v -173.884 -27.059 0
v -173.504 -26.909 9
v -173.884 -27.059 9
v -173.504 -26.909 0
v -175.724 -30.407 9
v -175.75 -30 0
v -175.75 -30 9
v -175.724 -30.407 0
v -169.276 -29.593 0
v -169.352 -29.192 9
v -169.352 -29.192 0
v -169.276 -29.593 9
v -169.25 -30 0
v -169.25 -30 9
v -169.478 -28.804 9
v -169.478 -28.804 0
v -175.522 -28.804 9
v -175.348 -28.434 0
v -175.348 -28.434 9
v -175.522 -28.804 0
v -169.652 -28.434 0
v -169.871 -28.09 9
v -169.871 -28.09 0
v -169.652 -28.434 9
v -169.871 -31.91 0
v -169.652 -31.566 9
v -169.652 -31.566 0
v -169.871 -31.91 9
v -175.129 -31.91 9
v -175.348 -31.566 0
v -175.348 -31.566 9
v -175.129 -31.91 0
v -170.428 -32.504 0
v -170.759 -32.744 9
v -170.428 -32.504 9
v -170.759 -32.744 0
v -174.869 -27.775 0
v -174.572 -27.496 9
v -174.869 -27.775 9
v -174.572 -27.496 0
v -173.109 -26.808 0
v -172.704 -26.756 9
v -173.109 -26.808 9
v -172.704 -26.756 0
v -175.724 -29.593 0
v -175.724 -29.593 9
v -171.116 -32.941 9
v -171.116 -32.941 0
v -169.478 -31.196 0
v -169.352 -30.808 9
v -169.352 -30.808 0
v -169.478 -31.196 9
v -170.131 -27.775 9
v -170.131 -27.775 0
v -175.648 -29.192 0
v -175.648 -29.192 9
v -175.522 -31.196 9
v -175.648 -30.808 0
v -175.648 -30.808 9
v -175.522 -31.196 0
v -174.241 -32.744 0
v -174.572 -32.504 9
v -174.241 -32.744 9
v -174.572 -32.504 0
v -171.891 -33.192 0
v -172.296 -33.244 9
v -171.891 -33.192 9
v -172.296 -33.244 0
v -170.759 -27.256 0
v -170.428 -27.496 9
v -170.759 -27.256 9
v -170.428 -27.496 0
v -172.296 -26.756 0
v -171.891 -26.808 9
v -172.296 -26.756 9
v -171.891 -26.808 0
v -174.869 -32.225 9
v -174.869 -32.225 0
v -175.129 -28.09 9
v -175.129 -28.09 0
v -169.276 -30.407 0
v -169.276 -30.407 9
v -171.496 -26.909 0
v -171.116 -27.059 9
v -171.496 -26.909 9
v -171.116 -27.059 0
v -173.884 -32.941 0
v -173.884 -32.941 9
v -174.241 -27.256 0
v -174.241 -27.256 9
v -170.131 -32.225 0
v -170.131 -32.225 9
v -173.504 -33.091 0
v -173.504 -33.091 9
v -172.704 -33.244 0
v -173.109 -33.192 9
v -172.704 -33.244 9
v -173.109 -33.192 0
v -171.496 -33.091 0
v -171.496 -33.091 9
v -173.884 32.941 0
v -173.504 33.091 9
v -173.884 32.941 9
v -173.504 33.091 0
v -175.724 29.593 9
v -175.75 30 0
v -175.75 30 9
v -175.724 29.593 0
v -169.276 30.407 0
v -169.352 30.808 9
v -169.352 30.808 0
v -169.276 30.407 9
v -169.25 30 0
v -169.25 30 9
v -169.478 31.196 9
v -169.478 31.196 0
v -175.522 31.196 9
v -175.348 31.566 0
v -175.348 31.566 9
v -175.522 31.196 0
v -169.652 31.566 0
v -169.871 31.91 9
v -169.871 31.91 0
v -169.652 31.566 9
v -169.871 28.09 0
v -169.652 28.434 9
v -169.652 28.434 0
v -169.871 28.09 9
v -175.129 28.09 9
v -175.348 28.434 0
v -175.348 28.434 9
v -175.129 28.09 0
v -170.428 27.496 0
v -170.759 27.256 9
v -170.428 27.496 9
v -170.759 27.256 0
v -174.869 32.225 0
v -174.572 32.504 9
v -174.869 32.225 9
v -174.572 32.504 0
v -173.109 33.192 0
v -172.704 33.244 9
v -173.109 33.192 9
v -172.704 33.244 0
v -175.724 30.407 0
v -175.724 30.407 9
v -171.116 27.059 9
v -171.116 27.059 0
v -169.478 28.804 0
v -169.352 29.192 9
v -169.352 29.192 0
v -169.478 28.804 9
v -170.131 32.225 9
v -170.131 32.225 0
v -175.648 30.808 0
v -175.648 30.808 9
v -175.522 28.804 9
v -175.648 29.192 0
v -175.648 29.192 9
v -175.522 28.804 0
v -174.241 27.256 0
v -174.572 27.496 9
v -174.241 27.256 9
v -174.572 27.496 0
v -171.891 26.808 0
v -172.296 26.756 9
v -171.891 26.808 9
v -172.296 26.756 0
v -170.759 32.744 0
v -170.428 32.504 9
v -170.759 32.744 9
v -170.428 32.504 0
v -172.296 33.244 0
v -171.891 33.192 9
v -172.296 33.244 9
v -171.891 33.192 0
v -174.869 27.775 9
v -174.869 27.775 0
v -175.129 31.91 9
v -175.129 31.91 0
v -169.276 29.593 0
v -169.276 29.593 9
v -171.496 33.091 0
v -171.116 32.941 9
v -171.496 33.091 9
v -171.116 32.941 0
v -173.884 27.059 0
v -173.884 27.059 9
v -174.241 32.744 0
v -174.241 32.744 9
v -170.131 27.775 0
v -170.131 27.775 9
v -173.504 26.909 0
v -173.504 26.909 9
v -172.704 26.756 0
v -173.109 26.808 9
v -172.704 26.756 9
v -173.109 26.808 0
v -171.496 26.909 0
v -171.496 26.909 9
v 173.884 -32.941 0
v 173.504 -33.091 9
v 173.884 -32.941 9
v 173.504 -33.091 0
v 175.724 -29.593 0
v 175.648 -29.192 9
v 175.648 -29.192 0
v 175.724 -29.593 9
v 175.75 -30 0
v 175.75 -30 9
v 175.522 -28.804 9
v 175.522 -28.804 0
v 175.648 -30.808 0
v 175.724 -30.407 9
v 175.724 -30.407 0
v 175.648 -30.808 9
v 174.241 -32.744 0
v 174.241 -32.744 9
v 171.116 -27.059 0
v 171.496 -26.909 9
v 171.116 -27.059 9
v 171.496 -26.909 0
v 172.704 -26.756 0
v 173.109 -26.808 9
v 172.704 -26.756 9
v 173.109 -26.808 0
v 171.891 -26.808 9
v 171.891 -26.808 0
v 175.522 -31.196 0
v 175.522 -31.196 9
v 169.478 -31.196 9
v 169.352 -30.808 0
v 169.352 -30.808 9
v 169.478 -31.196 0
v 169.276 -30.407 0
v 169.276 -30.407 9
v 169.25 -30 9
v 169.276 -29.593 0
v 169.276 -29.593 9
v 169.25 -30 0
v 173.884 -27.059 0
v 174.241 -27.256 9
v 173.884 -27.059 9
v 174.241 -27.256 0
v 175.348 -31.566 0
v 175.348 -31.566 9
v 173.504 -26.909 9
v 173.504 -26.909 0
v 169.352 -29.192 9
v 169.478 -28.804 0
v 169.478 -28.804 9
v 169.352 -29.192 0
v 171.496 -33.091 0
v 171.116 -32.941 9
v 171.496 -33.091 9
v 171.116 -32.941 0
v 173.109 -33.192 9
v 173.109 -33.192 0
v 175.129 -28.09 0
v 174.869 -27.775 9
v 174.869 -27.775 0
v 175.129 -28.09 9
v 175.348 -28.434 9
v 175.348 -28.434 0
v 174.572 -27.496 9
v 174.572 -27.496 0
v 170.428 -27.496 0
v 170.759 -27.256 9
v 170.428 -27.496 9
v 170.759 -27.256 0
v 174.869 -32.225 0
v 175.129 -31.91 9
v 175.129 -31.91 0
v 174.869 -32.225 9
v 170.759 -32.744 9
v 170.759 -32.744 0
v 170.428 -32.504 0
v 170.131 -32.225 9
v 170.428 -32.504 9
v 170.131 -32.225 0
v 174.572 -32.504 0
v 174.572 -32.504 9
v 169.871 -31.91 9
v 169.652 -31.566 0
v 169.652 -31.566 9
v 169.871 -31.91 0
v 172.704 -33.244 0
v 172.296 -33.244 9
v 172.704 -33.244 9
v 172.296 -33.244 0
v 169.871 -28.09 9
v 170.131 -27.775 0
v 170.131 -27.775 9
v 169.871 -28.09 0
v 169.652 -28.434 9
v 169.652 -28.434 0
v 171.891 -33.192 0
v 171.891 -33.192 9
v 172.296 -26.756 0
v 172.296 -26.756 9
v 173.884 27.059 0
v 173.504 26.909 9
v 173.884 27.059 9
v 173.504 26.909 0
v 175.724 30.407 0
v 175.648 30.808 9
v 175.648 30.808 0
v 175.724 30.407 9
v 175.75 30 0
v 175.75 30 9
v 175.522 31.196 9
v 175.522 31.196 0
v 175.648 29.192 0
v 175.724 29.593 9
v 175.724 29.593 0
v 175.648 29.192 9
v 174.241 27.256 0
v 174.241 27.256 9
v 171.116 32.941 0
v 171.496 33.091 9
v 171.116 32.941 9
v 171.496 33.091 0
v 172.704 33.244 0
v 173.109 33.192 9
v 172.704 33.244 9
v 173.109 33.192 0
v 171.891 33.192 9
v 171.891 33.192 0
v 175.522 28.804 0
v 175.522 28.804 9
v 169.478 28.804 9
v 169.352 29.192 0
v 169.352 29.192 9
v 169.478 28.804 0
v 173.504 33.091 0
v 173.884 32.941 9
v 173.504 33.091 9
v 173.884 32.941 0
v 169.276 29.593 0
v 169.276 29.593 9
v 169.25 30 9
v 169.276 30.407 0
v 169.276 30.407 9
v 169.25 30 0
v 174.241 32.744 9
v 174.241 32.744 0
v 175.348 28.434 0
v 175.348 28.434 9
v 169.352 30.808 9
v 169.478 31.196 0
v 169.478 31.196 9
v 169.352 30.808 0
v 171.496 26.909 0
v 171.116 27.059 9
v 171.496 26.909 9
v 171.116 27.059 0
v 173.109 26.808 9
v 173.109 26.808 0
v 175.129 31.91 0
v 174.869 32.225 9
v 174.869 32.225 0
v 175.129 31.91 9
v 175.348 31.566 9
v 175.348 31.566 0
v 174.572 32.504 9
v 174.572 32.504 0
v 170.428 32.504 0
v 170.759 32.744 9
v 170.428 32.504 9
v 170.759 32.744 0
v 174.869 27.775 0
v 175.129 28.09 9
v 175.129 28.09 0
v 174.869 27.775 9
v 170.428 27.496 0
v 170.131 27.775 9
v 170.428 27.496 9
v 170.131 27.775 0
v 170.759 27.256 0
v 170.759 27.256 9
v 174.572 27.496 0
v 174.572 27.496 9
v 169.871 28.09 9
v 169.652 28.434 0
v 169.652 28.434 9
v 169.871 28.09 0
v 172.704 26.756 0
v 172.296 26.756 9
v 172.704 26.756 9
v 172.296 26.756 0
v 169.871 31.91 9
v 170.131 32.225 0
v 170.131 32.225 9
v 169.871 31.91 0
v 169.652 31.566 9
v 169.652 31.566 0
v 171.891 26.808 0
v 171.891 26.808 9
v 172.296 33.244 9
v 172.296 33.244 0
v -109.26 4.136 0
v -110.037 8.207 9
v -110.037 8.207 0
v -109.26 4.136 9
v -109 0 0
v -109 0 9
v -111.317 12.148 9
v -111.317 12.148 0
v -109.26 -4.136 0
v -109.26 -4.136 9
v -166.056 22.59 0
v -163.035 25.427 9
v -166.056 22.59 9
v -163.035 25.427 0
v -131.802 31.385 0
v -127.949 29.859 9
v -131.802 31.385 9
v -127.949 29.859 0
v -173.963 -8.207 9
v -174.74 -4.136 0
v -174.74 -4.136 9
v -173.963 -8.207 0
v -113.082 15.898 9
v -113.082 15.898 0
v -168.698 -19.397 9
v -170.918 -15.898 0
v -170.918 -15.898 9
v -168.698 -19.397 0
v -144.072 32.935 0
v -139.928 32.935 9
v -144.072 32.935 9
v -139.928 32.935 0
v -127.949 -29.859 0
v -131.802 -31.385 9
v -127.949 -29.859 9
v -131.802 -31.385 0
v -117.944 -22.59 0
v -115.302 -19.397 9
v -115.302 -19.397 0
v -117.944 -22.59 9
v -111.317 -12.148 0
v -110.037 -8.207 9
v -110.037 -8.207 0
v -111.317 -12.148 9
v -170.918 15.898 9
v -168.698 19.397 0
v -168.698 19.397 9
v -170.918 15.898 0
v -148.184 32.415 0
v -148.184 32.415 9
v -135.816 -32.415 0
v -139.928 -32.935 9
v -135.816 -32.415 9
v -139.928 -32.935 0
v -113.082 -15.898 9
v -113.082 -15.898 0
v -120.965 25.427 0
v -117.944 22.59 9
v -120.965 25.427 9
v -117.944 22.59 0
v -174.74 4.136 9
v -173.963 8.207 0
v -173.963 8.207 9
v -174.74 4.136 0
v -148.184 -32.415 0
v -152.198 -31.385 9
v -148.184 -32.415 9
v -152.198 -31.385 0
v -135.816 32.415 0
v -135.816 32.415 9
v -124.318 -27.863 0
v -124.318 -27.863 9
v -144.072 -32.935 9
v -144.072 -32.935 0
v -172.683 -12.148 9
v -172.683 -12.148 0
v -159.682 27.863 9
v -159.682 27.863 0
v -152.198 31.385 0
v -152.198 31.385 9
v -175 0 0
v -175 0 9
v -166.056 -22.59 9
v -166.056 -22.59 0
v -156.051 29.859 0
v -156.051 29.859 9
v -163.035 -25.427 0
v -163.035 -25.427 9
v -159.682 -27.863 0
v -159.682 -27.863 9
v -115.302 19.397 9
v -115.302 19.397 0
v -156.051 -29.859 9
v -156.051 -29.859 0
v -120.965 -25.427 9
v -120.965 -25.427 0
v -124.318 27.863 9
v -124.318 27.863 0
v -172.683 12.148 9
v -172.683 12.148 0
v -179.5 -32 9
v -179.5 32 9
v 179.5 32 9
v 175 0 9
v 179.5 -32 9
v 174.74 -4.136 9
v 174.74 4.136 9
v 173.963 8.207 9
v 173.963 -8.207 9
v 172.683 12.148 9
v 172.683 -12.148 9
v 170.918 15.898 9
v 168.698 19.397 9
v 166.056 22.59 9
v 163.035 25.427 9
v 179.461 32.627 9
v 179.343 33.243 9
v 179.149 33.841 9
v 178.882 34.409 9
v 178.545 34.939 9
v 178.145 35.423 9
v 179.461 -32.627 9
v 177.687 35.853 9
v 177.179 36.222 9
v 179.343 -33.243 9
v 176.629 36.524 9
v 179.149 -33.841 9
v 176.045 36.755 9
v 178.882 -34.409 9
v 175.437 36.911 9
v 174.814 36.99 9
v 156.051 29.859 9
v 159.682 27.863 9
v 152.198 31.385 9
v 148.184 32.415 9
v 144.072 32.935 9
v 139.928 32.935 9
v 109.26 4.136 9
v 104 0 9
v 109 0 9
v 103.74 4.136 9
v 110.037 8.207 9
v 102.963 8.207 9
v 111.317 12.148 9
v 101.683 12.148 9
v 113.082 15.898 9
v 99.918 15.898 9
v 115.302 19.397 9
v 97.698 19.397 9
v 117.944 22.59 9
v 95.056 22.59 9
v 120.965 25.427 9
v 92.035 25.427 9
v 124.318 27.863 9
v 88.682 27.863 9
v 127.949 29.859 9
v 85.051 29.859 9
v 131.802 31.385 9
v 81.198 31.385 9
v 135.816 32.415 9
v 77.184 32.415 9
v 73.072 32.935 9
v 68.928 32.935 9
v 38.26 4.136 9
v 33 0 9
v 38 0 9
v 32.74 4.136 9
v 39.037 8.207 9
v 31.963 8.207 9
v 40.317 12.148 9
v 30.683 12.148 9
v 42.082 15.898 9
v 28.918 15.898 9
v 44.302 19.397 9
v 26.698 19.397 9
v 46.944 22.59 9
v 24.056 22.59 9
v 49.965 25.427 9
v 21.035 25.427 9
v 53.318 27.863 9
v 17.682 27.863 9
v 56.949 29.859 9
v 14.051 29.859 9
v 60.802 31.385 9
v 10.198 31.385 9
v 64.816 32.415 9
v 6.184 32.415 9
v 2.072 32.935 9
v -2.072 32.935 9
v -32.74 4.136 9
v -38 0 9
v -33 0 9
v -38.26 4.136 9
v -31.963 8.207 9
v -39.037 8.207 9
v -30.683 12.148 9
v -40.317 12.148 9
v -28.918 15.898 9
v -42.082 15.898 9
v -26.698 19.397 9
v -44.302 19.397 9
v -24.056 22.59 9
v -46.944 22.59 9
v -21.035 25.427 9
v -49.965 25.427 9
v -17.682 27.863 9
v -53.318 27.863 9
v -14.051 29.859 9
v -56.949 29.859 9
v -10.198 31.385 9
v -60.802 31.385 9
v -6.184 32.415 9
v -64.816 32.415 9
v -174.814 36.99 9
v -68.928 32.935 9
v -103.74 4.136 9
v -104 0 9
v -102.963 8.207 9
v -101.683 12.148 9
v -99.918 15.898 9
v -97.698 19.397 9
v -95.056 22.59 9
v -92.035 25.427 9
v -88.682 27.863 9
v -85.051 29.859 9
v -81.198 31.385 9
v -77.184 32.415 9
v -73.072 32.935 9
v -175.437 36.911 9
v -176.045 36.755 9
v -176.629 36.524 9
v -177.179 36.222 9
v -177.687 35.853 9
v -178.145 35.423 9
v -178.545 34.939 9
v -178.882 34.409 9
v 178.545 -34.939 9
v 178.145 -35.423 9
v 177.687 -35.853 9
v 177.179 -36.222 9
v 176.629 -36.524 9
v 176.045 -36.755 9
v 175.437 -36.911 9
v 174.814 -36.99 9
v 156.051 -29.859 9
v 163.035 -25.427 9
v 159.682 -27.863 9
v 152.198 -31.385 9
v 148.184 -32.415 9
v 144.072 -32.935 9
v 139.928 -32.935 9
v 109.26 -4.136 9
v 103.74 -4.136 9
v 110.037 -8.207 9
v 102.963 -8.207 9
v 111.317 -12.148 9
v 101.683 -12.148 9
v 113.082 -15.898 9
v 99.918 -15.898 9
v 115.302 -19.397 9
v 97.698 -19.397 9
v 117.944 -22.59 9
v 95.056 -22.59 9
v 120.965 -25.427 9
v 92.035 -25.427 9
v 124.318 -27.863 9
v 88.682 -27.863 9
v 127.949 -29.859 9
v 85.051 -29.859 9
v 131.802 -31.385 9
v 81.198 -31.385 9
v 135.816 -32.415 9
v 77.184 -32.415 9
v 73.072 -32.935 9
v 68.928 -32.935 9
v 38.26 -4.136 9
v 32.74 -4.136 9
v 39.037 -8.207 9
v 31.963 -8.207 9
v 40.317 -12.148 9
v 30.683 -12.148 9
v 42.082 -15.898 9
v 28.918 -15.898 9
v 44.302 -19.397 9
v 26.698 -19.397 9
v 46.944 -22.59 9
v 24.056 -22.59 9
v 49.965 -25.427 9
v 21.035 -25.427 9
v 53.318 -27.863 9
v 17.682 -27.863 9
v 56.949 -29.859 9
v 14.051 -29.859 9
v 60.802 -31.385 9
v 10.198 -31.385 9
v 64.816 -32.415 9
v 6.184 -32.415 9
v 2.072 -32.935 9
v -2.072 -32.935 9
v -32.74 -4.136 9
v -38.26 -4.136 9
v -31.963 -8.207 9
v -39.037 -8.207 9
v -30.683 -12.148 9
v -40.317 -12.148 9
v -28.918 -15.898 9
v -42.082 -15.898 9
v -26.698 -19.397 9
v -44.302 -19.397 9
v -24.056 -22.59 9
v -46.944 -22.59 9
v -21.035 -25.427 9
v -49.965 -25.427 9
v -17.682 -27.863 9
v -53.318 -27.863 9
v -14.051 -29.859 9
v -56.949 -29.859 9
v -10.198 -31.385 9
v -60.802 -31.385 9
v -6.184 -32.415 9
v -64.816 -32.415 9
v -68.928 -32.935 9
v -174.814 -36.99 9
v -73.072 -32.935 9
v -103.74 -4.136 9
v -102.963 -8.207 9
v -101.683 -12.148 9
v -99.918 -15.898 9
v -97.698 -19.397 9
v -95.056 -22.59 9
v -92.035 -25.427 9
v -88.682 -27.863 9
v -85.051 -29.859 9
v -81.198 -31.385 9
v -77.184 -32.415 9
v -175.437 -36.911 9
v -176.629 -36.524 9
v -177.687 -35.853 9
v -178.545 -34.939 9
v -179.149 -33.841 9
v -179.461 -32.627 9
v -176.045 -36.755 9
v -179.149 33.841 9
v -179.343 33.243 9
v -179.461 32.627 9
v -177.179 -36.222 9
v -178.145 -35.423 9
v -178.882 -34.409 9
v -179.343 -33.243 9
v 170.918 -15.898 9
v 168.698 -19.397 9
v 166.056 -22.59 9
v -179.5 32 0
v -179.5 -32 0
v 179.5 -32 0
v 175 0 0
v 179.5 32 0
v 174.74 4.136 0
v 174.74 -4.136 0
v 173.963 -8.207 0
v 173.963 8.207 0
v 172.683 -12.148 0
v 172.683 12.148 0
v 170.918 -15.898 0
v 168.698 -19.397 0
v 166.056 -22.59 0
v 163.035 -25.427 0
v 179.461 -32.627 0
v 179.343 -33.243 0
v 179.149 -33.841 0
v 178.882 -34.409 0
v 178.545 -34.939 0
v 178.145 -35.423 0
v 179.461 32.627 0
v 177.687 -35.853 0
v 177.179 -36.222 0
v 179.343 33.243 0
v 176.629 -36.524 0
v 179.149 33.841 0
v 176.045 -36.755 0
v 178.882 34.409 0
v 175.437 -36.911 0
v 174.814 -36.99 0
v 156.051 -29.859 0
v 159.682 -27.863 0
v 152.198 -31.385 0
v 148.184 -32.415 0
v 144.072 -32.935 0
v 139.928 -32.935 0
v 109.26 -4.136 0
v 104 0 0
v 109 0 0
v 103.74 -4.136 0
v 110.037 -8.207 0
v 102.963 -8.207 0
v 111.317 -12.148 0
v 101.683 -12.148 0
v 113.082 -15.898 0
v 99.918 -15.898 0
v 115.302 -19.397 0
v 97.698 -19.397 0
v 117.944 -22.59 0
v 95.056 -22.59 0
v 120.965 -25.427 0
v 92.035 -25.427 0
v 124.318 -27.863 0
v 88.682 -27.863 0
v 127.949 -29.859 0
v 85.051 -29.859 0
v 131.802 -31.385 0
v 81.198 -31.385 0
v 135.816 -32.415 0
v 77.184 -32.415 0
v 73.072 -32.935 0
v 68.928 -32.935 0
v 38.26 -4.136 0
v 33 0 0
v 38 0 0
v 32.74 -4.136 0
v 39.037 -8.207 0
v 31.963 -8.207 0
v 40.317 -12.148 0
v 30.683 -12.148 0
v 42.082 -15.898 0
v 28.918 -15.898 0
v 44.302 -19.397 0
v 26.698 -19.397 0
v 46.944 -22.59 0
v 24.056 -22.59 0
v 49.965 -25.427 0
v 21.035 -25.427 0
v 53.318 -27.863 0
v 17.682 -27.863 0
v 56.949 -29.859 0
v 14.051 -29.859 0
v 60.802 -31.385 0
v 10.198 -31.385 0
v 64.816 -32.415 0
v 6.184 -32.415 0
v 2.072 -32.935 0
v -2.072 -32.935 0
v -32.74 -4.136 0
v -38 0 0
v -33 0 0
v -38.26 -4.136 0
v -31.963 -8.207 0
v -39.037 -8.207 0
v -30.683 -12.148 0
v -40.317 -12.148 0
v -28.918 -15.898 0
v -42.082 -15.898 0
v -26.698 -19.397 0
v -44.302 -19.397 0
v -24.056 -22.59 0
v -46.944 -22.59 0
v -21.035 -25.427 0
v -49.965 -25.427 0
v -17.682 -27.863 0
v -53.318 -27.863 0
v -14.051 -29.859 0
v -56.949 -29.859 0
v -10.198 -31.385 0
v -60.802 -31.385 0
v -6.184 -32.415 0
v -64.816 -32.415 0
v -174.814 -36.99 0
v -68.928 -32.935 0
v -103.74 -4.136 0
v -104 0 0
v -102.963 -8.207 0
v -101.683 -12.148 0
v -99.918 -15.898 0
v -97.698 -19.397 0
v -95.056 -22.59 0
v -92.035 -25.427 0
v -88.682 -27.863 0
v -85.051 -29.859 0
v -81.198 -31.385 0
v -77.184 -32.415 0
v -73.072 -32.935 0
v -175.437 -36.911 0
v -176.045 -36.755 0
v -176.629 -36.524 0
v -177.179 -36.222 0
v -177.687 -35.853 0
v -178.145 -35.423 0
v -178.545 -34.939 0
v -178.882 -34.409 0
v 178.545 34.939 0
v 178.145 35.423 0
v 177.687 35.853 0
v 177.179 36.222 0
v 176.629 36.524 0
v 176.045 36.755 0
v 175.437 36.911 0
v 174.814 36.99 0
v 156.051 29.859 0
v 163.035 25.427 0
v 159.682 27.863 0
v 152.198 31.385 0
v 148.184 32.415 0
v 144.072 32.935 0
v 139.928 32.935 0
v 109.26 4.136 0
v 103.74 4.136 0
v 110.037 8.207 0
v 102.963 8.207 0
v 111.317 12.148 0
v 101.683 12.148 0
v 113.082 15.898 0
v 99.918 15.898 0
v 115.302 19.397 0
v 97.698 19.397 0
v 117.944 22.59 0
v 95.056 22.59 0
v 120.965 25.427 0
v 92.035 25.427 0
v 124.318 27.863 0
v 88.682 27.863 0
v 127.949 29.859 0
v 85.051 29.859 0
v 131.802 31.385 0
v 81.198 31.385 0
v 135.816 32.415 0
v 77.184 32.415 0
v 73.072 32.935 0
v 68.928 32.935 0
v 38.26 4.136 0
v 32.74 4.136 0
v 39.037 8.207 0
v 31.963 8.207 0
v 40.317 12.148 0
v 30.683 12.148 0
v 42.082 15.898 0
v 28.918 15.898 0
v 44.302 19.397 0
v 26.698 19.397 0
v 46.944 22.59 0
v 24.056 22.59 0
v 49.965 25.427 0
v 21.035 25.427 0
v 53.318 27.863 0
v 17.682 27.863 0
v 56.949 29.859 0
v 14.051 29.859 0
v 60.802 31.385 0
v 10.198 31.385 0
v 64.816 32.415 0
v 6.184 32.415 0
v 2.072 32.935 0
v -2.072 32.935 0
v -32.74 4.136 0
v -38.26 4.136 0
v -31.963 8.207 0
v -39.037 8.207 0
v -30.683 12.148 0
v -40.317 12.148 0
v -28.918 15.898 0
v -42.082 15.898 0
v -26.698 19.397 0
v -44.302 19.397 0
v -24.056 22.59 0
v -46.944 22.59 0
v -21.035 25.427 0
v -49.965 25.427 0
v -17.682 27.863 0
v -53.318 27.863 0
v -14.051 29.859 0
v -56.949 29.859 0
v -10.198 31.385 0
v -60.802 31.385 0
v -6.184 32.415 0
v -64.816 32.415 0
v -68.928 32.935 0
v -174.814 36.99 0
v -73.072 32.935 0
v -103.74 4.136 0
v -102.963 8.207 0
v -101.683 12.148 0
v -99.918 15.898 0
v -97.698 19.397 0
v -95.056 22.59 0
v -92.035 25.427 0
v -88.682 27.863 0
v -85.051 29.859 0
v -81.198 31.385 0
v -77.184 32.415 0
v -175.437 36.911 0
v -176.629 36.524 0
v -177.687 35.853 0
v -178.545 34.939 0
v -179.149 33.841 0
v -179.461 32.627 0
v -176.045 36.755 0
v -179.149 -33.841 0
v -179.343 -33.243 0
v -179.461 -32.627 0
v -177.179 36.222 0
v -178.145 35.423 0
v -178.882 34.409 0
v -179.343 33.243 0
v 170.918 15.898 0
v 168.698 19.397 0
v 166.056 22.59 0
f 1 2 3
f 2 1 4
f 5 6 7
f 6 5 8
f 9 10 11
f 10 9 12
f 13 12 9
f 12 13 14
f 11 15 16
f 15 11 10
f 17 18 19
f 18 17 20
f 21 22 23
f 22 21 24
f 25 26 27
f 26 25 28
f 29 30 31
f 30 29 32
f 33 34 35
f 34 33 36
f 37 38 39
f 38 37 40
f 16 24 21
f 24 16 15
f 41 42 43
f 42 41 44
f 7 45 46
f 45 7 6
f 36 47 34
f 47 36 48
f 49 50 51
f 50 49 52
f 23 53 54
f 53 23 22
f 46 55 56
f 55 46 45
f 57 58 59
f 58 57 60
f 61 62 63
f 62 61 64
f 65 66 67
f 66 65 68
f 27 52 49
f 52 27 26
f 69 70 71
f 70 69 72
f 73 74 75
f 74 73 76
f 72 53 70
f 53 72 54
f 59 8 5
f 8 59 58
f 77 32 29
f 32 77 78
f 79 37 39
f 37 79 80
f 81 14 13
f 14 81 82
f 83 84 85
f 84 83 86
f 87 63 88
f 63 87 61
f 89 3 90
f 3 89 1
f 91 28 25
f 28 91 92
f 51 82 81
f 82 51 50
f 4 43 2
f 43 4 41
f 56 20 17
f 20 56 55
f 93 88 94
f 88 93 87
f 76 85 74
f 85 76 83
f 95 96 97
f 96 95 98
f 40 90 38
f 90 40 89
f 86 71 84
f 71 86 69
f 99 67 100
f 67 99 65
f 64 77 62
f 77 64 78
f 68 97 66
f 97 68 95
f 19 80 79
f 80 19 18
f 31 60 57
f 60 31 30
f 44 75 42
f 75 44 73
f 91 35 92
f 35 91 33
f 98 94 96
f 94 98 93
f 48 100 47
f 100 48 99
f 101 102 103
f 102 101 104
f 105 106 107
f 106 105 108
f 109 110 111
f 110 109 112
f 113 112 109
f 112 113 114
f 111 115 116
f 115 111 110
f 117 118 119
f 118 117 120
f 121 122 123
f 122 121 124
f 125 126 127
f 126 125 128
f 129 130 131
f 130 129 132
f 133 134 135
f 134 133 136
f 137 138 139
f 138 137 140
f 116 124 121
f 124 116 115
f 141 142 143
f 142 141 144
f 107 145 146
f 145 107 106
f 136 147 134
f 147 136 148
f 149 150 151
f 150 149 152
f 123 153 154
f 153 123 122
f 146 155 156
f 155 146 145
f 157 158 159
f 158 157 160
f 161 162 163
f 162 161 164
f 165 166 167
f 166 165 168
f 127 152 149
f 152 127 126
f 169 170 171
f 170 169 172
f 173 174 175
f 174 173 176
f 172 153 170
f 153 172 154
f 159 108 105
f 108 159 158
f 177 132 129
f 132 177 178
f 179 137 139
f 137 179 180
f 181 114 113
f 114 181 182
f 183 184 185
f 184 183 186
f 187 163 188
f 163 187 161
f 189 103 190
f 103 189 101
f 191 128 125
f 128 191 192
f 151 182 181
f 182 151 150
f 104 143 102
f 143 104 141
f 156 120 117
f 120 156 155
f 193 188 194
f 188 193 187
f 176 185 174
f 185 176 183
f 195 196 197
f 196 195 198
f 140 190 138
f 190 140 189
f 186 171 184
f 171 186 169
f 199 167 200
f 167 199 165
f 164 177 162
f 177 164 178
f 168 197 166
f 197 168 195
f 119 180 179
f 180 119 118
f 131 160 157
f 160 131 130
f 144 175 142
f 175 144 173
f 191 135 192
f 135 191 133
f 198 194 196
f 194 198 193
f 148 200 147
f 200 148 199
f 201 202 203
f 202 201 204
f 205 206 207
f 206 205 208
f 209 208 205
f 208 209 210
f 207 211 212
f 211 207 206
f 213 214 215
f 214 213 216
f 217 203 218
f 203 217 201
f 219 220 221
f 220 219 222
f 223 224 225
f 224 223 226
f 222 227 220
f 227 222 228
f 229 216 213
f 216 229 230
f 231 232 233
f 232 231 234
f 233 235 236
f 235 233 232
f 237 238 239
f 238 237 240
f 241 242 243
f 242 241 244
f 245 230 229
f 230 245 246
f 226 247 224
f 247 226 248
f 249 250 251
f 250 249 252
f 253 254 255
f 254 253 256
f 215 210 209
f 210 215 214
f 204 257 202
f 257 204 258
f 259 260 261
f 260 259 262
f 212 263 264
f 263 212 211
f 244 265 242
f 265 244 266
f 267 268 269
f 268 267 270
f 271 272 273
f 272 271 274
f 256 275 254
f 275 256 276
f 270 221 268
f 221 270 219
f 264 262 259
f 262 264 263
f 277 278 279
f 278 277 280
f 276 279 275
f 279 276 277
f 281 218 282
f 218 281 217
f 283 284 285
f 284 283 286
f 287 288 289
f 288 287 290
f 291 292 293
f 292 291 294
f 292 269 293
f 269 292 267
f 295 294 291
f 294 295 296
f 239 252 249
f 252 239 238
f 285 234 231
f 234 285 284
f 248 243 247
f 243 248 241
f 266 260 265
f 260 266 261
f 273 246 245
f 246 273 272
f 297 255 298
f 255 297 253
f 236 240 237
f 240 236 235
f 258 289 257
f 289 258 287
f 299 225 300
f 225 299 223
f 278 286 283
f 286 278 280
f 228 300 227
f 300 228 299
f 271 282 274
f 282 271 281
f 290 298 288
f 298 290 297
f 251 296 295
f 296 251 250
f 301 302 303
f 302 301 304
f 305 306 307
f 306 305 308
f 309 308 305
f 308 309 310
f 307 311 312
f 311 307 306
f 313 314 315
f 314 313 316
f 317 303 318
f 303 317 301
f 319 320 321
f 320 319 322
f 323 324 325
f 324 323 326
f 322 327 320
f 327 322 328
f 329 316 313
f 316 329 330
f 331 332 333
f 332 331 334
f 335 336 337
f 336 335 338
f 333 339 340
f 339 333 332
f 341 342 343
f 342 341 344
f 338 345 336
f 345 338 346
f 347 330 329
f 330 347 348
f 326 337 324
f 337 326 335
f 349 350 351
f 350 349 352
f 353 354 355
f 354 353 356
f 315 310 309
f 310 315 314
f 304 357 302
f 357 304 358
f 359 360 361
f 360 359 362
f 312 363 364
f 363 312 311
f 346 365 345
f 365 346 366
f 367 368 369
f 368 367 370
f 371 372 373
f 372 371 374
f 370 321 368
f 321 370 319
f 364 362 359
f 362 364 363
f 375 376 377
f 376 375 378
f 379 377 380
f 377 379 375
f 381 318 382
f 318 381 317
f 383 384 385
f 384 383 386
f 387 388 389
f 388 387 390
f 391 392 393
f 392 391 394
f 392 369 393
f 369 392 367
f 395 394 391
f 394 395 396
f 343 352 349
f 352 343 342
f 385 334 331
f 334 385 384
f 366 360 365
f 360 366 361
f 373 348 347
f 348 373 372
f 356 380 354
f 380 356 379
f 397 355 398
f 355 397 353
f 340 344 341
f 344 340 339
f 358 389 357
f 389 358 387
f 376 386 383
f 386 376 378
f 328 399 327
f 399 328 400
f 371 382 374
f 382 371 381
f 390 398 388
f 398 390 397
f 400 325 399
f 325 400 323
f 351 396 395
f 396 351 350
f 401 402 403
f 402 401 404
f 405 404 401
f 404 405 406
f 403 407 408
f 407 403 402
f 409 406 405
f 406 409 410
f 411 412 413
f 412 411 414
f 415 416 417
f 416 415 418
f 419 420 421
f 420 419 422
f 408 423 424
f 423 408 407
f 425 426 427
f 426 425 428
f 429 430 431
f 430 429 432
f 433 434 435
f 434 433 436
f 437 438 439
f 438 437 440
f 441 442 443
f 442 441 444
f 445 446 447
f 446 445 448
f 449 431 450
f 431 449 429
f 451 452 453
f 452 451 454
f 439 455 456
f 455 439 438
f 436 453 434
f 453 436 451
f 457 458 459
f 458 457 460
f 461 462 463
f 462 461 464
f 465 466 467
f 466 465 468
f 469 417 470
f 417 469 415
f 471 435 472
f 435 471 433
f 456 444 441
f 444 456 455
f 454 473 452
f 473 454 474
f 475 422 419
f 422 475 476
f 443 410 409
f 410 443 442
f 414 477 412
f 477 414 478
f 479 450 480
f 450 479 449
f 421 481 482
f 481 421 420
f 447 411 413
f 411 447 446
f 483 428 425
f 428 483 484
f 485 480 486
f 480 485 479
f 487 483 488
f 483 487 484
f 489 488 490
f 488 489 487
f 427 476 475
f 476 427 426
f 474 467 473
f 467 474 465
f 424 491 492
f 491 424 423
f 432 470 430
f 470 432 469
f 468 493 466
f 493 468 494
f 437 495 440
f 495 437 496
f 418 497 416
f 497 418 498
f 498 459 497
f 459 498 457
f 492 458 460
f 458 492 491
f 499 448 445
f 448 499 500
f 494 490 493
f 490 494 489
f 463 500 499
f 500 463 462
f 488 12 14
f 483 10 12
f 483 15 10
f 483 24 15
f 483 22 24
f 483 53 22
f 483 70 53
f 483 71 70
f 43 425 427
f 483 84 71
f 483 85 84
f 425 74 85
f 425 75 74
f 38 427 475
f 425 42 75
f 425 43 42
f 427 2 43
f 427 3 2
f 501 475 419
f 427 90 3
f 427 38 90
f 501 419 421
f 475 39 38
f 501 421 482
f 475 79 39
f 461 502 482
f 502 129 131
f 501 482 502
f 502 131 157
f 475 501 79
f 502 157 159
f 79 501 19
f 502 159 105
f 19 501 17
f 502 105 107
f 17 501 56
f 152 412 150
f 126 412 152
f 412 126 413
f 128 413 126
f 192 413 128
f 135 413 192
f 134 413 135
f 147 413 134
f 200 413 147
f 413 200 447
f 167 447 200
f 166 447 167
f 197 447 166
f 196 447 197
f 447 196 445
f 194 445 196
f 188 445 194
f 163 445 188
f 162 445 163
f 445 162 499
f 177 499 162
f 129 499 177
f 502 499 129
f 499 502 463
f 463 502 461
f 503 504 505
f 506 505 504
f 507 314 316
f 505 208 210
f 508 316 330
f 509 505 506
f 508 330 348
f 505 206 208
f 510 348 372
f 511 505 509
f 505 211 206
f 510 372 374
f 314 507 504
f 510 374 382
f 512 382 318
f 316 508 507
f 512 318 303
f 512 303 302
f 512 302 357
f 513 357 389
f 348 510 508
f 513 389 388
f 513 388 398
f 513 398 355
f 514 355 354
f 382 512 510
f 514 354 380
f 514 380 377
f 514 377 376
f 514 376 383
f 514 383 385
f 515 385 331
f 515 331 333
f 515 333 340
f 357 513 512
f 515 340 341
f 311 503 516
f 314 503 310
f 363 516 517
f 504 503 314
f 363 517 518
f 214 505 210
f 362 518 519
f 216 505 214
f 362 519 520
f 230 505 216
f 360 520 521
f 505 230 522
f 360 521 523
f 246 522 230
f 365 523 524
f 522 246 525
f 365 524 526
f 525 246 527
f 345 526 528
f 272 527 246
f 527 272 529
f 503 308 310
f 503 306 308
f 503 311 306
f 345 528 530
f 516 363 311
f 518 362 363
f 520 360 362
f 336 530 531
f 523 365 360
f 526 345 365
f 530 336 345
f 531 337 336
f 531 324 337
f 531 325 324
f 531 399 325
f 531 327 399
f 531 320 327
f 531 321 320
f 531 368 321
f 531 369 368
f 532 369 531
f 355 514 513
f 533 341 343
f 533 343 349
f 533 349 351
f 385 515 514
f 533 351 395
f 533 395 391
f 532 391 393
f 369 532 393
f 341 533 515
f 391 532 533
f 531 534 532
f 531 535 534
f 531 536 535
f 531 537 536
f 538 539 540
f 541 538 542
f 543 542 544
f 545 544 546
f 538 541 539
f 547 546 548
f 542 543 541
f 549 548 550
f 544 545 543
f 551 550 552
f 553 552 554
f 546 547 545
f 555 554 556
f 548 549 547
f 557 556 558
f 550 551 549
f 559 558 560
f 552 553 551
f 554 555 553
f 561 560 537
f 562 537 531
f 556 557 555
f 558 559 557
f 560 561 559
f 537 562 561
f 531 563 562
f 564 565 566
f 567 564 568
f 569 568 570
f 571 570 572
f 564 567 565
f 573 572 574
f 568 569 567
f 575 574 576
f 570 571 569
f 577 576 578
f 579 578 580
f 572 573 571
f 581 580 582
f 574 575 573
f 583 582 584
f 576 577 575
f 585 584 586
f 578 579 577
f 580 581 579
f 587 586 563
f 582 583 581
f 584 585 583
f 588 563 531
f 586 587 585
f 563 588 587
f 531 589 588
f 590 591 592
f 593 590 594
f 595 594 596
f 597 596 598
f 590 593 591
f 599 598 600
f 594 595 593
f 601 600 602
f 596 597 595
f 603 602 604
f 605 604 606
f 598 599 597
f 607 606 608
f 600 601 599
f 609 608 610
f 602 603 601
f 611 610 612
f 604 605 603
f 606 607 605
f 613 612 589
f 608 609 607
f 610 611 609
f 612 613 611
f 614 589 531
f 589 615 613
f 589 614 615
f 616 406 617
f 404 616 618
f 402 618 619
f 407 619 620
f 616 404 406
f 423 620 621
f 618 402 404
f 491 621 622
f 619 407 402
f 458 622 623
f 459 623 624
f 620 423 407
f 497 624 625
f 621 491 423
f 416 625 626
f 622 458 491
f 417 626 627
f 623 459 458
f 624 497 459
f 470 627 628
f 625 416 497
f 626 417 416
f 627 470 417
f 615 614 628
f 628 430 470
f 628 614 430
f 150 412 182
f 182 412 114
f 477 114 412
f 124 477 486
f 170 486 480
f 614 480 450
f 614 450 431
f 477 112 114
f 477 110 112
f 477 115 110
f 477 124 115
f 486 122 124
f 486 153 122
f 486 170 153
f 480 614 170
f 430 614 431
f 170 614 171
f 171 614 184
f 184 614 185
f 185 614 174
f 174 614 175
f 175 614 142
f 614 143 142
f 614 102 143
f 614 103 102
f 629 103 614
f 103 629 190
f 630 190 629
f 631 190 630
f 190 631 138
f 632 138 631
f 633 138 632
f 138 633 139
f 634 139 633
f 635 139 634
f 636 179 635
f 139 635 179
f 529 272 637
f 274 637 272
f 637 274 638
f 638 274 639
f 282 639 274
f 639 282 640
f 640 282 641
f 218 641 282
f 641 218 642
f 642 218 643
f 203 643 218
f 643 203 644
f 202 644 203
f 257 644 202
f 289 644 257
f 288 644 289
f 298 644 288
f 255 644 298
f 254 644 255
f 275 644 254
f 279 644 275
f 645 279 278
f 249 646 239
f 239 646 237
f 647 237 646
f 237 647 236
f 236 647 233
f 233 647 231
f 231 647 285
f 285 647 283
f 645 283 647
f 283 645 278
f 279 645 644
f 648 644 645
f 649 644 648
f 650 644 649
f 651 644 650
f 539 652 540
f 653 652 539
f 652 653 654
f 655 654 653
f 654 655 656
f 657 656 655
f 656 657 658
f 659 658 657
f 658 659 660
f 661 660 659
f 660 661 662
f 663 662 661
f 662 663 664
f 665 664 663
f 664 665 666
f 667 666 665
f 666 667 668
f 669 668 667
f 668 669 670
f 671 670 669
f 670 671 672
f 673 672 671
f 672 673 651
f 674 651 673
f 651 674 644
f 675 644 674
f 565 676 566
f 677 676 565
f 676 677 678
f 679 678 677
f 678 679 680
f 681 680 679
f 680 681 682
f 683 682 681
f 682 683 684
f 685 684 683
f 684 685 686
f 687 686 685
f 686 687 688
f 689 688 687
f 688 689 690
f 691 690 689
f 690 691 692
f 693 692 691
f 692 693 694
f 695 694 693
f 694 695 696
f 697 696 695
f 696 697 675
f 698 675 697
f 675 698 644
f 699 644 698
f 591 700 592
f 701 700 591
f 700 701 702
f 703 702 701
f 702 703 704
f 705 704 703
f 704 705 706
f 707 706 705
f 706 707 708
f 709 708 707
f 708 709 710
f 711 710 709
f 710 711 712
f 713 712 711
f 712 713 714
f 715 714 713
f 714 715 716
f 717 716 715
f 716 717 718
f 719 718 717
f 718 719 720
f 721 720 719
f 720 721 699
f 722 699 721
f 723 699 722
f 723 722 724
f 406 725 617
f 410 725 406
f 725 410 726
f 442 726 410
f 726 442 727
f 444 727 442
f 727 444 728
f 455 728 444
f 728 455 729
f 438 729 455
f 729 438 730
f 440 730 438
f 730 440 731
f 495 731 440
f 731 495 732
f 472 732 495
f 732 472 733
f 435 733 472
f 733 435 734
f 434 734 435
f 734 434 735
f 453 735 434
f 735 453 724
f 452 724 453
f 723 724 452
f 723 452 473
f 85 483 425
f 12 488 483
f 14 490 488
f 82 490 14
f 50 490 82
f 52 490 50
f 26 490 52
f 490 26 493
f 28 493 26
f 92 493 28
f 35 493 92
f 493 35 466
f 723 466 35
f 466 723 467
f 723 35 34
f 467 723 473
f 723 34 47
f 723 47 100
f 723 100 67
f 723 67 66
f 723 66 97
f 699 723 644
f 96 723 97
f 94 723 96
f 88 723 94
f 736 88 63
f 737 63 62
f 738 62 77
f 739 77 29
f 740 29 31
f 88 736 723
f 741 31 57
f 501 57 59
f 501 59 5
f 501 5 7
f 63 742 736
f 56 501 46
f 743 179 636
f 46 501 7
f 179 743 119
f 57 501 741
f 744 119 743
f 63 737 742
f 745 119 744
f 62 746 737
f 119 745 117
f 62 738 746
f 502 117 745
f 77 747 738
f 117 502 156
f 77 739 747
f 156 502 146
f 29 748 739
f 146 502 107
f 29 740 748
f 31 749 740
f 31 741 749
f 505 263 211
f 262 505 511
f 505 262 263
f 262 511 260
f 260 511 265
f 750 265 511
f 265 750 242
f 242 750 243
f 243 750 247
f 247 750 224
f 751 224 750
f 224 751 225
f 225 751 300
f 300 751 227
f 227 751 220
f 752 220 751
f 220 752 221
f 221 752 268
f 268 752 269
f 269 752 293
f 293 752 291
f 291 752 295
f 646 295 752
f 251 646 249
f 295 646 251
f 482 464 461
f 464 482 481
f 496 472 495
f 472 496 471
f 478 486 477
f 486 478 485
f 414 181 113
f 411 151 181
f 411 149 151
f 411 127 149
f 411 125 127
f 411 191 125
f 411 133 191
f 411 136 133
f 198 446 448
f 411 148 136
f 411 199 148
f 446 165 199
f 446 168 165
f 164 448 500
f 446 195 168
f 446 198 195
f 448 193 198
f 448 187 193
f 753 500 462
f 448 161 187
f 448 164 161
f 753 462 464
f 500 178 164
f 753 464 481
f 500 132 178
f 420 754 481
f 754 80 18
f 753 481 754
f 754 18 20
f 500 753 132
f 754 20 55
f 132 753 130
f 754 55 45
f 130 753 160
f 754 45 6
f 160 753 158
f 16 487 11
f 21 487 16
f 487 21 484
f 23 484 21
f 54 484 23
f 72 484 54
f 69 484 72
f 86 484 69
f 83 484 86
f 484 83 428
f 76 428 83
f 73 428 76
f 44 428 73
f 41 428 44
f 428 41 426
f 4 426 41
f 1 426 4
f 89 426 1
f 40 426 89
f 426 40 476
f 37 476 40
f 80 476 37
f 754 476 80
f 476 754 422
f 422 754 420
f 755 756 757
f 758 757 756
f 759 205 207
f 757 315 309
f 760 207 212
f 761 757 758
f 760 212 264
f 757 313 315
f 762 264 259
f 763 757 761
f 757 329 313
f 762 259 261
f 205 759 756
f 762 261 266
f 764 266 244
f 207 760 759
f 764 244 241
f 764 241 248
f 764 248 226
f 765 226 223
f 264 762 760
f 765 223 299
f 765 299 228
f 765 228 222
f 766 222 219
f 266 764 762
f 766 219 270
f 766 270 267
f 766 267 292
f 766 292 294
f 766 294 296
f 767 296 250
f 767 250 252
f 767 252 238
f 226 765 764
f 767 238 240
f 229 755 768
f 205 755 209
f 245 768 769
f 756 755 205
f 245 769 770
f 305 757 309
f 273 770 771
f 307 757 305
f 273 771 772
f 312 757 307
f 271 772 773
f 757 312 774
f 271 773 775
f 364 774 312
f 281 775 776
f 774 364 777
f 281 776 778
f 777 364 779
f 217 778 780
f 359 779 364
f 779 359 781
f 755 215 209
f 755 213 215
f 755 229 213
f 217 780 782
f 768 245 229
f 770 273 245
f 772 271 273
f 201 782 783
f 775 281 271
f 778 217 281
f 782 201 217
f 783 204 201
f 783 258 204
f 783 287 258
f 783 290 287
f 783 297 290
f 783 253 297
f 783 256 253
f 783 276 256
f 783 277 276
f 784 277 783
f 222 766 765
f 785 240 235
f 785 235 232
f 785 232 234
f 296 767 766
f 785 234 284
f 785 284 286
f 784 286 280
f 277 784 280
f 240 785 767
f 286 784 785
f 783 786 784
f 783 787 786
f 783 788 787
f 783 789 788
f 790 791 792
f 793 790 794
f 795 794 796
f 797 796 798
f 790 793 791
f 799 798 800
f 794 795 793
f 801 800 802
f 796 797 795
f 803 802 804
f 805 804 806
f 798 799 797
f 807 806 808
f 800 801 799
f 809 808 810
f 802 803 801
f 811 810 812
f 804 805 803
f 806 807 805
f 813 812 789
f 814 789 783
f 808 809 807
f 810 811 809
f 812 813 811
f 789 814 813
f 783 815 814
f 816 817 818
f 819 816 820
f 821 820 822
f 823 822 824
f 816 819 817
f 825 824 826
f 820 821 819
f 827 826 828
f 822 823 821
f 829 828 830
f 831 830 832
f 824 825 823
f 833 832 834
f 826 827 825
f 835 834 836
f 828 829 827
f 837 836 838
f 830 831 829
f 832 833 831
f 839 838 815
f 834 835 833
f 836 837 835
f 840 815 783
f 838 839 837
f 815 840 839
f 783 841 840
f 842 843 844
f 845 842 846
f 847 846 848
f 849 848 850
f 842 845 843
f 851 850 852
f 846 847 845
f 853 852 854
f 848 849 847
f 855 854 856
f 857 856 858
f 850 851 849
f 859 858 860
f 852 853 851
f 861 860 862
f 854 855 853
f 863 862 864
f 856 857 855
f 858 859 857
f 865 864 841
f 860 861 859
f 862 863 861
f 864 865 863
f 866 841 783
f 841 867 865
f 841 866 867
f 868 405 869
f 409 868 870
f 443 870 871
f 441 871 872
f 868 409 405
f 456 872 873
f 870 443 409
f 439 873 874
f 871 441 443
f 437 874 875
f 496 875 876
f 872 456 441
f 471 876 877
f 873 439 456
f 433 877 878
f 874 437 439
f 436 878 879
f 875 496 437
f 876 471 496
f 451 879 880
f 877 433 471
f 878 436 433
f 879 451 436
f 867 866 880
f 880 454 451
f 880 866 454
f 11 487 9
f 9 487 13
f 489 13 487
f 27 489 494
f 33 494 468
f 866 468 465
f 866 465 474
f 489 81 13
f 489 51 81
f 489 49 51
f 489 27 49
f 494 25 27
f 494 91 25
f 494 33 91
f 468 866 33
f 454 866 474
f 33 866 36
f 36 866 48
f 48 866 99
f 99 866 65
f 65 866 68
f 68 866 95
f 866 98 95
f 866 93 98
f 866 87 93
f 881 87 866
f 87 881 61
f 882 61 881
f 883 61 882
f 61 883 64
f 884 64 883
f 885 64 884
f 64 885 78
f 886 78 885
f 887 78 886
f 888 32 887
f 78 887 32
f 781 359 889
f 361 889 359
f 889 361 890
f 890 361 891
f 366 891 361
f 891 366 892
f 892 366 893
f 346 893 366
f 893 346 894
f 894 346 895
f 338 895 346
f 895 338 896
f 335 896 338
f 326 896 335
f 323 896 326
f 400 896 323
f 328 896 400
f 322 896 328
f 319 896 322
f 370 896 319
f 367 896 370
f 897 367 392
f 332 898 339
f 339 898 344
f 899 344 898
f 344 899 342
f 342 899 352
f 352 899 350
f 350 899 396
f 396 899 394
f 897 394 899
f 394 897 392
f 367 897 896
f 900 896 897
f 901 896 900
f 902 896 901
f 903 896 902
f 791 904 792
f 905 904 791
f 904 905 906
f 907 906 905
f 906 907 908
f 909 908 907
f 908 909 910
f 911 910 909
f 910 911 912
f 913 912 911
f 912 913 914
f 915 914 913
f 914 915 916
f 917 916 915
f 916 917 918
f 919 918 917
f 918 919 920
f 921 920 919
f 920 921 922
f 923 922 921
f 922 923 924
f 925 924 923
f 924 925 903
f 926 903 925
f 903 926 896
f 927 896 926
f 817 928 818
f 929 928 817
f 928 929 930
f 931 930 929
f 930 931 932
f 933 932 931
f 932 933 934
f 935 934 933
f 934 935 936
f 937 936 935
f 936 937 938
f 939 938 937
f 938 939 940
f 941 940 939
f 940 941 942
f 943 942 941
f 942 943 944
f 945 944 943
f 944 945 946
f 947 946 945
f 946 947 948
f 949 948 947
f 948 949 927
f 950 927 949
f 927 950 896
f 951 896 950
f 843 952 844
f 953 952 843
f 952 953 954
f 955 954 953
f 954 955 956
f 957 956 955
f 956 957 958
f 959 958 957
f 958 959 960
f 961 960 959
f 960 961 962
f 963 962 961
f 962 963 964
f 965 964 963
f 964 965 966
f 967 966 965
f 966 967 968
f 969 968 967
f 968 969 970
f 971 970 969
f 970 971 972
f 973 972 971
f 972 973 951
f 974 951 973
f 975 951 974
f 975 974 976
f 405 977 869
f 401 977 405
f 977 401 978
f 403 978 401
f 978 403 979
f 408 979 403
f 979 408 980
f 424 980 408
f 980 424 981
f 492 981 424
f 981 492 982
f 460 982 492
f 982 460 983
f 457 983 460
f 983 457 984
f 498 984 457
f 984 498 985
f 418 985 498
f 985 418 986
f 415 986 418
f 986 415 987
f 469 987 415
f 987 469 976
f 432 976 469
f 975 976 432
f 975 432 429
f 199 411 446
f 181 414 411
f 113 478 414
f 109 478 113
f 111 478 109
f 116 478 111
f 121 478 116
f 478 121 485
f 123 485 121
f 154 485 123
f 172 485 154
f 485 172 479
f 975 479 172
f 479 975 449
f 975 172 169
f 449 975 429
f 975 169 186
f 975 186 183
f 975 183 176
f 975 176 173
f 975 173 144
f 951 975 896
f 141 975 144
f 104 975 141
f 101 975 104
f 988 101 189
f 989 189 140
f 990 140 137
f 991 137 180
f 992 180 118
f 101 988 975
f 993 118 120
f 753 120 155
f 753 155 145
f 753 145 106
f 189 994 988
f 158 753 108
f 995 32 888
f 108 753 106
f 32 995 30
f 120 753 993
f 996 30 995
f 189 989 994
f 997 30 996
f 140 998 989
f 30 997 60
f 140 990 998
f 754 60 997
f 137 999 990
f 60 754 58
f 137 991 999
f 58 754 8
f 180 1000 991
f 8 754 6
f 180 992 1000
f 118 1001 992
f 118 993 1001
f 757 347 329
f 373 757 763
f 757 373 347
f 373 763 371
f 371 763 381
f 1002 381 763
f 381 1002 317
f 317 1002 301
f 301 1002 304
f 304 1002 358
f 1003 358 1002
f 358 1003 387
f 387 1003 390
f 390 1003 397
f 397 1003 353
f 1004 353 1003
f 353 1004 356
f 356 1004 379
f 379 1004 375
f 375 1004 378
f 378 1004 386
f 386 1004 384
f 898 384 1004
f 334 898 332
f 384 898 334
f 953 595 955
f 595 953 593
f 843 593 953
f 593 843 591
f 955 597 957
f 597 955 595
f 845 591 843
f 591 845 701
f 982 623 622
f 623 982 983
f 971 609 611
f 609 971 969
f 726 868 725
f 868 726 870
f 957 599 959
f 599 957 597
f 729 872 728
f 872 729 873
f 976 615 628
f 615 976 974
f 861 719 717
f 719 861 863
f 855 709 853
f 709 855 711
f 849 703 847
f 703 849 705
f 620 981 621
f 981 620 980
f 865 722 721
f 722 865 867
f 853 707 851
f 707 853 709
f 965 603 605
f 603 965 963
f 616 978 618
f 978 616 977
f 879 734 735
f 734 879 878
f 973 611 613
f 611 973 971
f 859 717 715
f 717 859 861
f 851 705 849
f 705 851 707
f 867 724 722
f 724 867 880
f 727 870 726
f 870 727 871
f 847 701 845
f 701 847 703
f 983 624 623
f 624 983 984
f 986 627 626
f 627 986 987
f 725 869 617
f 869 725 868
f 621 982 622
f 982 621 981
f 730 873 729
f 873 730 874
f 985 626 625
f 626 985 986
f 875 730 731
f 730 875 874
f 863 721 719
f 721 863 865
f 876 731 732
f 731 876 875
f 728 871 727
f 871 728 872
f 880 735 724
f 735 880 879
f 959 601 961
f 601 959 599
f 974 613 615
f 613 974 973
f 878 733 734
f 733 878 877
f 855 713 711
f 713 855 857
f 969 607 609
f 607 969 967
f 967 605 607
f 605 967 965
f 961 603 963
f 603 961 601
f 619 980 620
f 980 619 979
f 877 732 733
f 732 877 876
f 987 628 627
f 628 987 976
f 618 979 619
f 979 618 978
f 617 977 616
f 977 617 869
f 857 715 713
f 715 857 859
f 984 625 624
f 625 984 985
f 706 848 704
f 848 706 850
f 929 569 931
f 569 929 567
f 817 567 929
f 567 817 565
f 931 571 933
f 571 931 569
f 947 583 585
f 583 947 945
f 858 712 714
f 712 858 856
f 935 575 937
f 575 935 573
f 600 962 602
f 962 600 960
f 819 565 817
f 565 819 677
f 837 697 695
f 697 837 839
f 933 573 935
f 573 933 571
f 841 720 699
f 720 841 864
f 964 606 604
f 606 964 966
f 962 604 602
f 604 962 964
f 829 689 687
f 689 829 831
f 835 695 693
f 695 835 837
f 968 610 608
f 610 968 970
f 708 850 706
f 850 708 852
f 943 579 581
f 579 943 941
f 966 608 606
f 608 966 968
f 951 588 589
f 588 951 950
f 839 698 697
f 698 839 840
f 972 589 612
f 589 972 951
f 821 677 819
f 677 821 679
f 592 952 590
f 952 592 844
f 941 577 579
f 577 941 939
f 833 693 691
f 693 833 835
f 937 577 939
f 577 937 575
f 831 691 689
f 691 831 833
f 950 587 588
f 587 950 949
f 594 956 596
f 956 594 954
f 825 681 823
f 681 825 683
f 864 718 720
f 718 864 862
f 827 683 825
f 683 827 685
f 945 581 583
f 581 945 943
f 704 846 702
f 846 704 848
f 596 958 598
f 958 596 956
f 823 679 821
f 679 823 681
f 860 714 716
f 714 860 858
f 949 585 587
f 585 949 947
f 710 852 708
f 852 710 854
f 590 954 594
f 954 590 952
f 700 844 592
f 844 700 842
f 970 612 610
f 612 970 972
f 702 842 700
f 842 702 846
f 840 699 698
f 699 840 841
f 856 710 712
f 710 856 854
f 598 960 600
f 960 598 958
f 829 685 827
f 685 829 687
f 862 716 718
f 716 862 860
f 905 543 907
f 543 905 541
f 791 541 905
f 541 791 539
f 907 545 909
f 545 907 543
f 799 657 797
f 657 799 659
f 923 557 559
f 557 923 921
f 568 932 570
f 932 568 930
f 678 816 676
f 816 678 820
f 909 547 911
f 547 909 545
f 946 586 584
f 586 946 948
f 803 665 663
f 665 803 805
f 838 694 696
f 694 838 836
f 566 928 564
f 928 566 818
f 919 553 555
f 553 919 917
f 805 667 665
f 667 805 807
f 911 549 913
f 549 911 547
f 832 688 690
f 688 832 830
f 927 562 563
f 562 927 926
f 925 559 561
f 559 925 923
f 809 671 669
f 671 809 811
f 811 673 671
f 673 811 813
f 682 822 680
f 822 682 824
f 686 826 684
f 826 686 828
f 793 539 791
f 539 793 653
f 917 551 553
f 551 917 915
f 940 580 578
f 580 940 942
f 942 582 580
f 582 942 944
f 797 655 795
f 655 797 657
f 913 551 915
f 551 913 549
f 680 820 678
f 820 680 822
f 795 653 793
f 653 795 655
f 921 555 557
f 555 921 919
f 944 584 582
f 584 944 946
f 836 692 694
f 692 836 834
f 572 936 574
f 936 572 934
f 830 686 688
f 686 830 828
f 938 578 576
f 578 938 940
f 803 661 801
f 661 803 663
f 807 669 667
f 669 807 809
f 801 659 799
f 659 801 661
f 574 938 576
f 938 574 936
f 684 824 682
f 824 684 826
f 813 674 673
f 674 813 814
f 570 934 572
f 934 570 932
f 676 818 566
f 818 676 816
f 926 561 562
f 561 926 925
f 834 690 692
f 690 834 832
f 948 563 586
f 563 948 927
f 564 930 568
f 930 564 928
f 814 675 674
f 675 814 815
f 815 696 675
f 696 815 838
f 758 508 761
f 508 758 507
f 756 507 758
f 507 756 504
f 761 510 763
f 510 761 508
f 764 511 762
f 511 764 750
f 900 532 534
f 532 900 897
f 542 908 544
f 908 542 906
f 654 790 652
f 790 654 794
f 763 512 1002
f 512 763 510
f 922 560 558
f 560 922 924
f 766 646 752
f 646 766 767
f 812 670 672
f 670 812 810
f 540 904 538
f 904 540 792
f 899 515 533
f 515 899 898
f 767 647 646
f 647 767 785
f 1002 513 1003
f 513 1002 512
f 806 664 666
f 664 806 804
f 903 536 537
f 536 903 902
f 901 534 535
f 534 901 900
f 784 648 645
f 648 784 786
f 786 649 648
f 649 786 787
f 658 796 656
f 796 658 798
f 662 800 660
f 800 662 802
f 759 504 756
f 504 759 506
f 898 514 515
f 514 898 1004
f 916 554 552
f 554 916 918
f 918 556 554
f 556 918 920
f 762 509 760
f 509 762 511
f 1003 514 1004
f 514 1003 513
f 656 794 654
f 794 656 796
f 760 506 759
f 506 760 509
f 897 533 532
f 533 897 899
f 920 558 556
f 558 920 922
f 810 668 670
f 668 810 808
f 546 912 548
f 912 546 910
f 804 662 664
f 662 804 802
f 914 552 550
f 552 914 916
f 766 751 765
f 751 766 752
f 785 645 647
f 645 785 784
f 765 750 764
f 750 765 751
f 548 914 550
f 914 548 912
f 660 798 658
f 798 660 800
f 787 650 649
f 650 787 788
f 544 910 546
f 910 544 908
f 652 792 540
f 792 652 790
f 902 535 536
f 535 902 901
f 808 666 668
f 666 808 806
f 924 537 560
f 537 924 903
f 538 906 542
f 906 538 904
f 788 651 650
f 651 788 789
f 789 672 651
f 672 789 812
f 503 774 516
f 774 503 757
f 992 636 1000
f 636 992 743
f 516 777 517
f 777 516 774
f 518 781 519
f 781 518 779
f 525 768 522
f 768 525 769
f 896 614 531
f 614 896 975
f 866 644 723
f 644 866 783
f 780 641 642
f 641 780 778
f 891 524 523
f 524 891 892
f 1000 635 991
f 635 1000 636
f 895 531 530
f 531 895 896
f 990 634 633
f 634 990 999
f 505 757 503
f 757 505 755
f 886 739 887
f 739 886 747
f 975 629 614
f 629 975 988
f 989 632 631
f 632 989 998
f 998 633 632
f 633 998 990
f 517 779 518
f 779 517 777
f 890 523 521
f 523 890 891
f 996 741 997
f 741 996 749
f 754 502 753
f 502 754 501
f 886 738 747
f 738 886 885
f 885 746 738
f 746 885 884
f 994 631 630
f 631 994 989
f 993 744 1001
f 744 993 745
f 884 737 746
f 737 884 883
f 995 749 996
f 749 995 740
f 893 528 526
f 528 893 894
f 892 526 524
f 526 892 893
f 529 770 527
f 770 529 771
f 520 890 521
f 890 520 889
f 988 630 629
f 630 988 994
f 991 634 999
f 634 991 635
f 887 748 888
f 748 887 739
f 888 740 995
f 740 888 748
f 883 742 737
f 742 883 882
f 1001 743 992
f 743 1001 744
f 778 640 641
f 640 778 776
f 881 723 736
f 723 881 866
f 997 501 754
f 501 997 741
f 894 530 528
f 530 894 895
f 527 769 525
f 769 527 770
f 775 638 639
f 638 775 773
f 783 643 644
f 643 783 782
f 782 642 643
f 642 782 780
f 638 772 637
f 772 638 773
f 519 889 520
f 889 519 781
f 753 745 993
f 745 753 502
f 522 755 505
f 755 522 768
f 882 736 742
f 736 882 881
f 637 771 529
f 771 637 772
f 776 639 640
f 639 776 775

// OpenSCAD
$fn = 50;


difference() {
	union() {
		hull() {
			translate(v = [-174.5000000000, 32.0000000000, 0]) {
				cylinder(h = 9, r = 5);
			}
			translate(v = [174.5000000000, 32.0000000000, 0]) {
				cylinder(h = 9, r = 5);
			}
			translate(v = [-174.5000000000, -32.0000000000, 0]) {
				cylinder(h = 9, r = 5);
			}
			translate(v = [174.5000000000, -32.0000000000, 0]) {
				cylinder(h = 9, r = 5);
			}
		}
	}
	union() {
		#translate(v = [-172.5000000000, -30.0000000000, -100.0000000000]) {
			cylinder(h = 200, r = 3.2500000000);
		}
		#translate(v = [-172.5000000000, 30.0000000000, -100.0000000000]) {
			cylinder(h = 200, r = 3.2500000000);
		}
		#translate(v = [172.5000000000, -30.0000000000, -100.0000000000]) {
			cylinder(h = 200, r = 3.2500000000);
		}
		#translate(v = [172.5000000000, 30.0000000000, -100.0000000000]) {
			cylinder(h = 200, r = 3.2500000000);
		}
		#translate(v = [-142.0000000000, 0, 0]) {
			cylinder(h = 9, r = 33.0000000000);
		}
		#translate(v = [-71.0000000000, 0, 0]) {
			cylinder(h = 9, r = 33.0000000000);
		}
		#cylinder(h = 9, r = 33.0000000000);
		#translate(v = [71.0000000000, 0, 0]) {
			cylinder(h = 9, r = 33.0000000000);
		}
		#translate(v = [142.0000000000, 0, 0]) {
			cylinder(h = 9, r = 33.0000000000);
		}
	}
}
